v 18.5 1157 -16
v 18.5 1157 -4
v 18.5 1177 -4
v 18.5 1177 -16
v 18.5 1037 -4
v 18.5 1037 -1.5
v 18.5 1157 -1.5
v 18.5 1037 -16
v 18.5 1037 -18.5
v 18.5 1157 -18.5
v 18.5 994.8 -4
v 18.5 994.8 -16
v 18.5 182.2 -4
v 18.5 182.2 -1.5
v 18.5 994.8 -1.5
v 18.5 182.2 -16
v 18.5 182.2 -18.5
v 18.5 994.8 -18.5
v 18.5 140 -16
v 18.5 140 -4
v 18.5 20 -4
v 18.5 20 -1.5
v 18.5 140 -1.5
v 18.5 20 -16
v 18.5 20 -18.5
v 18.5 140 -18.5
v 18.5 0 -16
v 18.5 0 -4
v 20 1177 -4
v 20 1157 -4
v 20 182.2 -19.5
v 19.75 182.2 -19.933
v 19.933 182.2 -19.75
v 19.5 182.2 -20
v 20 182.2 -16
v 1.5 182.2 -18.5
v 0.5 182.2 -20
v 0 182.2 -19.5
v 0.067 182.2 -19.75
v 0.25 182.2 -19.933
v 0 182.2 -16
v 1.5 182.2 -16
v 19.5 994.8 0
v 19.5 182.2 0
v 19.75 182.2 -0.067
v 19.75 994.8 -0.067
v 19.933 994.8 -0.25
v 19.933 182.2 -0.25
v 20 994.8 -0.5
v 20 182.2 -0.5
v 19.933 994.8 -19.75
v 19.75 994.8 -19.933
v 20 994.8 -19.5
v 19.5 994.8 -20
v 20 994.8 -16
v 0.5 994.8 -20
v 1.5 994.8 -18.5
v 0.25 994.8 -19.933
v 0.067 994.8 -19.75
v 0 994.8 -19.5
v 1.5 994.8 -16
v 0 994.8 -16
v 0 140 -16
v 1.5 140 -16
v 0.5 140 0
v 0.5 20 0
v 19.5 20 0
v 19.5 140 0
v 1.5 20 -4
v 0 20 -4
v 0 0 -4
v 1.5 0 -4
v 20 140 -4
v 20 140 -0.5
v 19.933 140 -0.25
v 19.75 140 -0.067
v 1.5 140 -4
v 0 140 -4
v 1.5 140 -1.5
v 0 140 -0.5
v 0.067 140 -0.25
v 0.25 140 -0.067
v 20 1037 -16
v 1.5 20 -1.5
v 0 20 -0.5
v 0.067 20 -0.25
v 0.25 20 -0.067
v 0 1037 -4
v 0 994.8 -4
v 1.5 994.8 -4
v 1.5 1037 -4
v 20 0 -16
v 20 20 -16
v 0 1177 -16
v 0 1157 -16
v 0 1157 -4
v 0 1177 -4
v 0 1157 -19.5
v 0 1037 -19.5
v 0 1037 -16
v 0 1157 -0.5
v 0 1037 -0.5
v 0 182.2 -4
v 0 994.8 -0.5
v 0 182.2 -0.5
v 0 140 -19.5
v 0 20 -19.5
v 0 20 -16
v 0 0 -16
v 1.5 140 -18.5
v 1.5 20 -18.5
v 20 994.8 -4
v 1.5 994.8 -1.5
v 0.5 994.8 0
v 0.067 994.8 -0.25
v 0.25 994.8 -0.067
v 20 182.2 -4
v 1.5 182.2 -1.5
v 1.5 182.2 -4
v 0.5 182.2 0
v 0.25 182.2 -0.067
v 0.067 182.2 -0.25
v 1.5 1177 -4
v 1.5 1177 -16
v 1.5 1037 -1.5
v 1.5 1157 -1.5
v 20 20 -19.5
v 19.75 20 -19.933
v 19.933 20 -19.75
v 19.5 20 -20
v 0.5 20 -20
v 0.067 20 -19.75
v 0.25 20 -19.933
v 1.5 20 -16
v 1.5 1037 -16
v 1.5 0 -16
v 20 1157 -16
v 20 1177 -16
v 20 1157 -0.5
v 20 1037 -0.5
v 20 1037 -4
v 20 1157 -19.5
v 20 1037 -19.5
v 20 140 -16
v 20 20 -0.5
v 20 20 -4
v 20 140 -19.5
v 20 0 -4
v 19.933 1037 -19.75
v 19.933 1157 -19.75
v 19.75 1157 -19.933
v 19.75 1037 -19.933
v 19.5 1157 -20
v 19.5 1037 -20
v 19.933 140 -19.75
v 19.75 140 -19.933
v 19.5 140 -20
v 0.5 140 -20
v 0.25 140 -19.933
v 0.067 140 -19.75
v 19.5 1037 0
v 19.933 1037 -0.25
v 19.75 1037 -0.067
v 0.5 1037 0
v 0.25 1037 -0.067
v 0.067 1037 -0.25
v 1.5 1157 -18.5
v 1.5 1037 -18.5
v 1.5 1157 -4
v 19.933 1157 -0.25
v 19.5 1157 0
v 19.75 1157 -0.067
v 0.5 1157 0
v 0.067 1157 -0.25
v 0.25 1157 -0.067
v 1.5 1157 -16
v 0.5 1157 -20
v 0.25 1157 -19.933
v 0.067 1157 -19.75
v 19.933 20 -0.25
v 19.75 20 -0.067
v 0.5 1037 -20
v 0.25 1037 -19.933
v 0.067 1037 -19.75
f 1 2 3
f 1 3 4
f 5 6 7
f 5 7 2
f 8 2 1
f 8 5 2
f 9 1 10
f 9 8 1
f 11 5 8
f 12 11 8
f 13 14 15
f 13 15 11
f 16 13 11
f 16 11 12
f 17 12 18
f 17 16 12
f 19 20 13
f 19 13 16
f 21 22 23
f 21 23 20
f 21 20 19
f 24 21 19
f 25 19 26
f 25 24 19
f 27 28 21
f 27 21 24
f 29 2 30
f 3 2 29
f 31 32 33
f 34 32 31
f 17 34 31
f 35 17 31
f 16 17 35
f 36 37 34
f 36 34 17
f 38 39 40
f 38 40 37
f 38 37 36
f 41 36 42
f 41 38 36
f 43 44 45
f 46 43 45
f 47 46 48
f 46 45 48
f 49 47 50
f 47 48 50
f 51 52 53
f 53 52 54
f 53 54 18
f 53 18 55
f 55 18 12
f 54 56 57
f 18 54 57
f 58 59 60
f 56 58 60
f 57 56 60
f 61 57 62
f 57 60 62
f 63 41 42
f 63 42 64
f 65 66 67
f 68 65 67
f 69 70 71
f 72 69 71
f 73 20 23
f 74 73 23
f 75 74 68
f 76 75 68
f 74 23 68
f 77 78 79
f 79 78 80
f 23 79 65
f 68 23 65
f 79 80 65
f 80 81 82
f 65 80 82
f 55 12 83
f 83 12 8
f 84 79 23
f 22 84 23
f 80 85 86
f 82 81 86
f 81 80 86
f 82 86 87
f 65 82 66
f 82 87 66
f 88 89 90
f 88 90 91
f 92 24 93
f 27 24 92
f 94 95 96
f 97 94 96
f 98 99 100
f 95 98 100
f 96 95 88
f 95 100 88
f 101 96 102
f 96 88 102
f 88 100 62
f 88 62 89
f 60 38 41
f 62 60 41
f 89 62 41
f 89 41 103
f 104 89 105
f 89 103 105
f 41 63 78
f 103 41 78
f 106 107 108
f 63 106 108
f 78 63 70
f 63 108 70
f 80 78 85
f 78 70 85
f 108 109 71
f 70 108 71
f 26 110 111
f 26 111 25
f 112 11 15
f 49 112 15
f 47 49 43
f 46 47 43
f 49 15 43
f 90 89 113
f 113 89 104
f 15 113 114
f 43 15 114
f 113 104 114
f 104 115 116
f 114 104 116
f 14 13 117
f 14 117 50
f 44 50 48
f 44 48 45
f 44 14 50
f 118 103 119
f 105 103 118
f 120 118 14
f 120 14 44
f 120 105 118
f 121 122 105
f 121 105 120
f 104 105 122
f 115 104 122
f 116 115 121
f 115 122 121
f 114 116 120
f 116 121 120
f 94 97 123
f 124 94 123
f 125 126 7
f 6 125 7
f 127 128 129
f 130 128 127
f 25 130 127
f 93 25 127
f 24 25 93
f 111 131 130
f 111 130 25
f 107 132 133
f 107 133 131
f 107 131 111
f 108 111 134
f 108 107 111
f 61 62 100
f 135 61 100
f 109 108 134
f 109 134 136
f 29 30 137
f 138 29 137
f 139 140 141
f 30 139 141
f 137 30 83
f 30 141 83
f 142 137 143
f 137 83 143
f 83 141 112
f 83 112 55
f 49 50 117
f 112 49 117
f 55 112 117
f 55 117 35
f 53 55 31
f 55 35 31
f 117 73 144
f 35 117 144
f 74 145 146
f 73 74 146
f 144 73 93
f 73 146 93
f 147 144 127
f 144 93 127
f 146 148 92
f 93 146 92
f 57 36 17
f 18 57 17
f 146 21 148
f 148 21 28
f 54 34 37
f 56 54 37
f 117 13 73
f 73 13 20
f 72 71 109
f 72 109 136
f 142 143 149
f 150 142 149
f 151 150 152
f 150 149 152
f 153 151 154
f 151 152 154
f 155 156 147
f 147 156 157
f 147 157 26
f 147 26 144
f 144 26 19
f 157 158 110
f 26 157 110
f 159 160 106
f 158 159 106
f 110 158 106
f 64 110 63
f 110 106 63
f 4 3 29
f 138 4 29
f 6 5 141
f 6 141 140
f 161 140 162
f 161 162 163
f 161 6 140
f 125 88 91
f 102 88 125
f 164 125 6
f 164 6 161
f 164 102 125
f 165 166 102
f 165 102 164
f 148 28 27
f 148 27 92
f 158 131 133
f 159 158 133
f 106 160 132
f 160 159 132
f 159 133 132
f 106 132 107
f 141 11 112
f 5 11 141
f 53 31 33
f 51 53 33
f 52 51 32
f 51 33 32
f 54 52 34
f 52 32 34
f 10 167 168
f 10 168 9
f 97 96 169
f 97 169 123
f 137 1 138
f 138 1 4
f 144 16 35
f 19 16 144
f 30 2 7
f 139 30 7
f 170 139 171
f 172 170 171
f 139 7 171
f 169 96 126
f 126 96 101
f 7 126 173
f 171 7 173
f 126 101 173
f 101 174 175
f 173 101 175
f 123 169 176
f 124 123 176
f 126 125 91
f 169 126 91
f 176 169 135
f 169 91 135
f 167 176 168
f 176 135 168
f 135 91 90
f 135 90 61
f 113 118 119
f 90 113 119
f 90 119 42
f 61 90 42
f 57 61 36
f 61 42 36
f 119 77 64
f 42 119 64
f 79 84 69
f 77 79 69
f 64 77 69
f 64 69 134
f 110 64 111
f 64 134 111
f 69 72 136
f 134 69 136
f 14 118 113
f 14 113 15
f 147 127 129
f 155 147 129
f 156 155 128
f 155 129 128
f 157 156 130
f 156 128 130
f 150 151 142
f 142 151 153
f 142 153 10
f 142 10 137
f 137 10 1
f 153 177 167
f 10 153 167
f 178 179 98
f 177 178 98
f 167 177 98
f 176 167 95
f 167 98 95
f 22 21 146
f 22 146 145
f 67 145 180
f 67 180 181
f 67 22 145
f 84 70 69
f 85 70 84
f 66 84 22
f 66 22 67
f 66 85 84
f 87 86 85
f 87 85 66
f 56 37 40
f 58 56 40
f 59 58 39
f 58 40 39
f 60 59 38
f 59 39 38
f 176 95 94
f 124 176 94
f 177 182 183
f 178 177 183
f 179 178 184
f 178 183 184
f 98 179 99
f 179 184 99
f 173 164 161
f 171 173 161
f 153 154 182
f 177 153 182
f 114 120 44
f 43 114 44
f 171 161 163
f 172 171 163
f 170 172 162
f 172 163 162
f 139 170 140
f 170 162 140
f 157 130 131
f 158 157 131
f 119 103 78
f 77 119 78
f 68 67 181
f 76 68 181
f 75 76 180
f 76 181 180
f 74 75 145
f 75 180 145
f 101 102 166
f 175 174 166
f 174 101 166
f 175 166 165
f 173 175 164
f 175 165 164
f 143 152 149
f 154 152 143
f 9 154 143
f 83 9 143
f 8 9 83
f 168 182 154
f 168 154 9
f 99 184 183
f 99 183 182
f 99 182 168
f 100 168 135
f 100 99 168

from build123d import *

# Parameters (mm, degrees)
SKETCH1_W           = 17
SKETCH1_H           = 17
BOSS_EXTRUDE1_DEPTH = 1177
SKETCH3_W           = 4
SKETCH3_H           = 20
CUT_EXTRUDE2_DEPTH  = 977
SKETCH2_W           = 4
SKETCH2_H           = 42.2
CUT_EXTRUDE1_DEPTH  = 1178.339798019


with BuildPart() as part:
    # Sketch1 → Boss-Extrude1 (new body)
    with BuildSketch(Plane(origin=(0, 0, 0), x_dir=(1, 0, 0), z_dir=(0, 1, 0))):
        with BuildLine():
            Line((0.5, 0), (19.5, 0))
            ThreePointArc((19.5, 0), (19.853553391, 0.146446609), (20, 0.5))
            Line((20, 0.5), (20, 19.5))
            ThreePointArc((20, 19.5), (19.853553391, 19.853553391), (19.5, 20))
            Line((19.5, 20), (0.5, 20))
            ThreePointArc((0.5, 20), (0.146446609, 19.853553391), (0, 19.5))
            Line((0, 19.5), (0, 0.5))
            ThreePointArc((0, 0.5), (0.146446609, 0.146446609), (0.5, 0))
        make_face()
        with Locations((10, 10)):
            Rectangle(SKETCH1_W, SKETCH1_H, mode=Mode.SUBTRACT)
    extrude(amount=BOSS_EXTRUDE1_DEPTH)

    # Sketch3 → Cut-Extrude2 (cut)
    with BuildSketch(Plane.ZY):
        with Locations((-2, 1167)):
            Rectangle(SKETCH3_W, SKETCH3_H)
        with Locations((-18, 1167)):
            Rectangle(SKETCH3_W, SKETCH3_H)
    cut_extrude2 = extrude(amount=-CUT_EXTRUDE2_DEPTH, mode=Mode.SUBTRACT)

    # Sketch2 → Cut-Extrude1 (cut, through all)
    with BuildSketch(Plane.ZY):
        with Locations((-2, 1015.9)):
            Rectangle(SKETCH2_W, SKETCH2_H)
        with Locations((-18, 1015.9)):
            Rectangle(SKETCH2_W, SKETCH2_H)
    cut_extrude1 = extrude(amount=-CUT_EXTRUDE1_DEPTH, mode=Mode.SUBTRACT)

    # Mirror1: Cut-Extrude2, Cut-Extrude1 across plane
    add(cut_extrude2.mirror(Plane.ZX.offset(588.5)), mode=Mode.SUBTRACT)
    add(cut_extrude1.mirror(Plane.ZX.offset(588.5)), mode=Mode.SUBTRACT)


solid = part.part
